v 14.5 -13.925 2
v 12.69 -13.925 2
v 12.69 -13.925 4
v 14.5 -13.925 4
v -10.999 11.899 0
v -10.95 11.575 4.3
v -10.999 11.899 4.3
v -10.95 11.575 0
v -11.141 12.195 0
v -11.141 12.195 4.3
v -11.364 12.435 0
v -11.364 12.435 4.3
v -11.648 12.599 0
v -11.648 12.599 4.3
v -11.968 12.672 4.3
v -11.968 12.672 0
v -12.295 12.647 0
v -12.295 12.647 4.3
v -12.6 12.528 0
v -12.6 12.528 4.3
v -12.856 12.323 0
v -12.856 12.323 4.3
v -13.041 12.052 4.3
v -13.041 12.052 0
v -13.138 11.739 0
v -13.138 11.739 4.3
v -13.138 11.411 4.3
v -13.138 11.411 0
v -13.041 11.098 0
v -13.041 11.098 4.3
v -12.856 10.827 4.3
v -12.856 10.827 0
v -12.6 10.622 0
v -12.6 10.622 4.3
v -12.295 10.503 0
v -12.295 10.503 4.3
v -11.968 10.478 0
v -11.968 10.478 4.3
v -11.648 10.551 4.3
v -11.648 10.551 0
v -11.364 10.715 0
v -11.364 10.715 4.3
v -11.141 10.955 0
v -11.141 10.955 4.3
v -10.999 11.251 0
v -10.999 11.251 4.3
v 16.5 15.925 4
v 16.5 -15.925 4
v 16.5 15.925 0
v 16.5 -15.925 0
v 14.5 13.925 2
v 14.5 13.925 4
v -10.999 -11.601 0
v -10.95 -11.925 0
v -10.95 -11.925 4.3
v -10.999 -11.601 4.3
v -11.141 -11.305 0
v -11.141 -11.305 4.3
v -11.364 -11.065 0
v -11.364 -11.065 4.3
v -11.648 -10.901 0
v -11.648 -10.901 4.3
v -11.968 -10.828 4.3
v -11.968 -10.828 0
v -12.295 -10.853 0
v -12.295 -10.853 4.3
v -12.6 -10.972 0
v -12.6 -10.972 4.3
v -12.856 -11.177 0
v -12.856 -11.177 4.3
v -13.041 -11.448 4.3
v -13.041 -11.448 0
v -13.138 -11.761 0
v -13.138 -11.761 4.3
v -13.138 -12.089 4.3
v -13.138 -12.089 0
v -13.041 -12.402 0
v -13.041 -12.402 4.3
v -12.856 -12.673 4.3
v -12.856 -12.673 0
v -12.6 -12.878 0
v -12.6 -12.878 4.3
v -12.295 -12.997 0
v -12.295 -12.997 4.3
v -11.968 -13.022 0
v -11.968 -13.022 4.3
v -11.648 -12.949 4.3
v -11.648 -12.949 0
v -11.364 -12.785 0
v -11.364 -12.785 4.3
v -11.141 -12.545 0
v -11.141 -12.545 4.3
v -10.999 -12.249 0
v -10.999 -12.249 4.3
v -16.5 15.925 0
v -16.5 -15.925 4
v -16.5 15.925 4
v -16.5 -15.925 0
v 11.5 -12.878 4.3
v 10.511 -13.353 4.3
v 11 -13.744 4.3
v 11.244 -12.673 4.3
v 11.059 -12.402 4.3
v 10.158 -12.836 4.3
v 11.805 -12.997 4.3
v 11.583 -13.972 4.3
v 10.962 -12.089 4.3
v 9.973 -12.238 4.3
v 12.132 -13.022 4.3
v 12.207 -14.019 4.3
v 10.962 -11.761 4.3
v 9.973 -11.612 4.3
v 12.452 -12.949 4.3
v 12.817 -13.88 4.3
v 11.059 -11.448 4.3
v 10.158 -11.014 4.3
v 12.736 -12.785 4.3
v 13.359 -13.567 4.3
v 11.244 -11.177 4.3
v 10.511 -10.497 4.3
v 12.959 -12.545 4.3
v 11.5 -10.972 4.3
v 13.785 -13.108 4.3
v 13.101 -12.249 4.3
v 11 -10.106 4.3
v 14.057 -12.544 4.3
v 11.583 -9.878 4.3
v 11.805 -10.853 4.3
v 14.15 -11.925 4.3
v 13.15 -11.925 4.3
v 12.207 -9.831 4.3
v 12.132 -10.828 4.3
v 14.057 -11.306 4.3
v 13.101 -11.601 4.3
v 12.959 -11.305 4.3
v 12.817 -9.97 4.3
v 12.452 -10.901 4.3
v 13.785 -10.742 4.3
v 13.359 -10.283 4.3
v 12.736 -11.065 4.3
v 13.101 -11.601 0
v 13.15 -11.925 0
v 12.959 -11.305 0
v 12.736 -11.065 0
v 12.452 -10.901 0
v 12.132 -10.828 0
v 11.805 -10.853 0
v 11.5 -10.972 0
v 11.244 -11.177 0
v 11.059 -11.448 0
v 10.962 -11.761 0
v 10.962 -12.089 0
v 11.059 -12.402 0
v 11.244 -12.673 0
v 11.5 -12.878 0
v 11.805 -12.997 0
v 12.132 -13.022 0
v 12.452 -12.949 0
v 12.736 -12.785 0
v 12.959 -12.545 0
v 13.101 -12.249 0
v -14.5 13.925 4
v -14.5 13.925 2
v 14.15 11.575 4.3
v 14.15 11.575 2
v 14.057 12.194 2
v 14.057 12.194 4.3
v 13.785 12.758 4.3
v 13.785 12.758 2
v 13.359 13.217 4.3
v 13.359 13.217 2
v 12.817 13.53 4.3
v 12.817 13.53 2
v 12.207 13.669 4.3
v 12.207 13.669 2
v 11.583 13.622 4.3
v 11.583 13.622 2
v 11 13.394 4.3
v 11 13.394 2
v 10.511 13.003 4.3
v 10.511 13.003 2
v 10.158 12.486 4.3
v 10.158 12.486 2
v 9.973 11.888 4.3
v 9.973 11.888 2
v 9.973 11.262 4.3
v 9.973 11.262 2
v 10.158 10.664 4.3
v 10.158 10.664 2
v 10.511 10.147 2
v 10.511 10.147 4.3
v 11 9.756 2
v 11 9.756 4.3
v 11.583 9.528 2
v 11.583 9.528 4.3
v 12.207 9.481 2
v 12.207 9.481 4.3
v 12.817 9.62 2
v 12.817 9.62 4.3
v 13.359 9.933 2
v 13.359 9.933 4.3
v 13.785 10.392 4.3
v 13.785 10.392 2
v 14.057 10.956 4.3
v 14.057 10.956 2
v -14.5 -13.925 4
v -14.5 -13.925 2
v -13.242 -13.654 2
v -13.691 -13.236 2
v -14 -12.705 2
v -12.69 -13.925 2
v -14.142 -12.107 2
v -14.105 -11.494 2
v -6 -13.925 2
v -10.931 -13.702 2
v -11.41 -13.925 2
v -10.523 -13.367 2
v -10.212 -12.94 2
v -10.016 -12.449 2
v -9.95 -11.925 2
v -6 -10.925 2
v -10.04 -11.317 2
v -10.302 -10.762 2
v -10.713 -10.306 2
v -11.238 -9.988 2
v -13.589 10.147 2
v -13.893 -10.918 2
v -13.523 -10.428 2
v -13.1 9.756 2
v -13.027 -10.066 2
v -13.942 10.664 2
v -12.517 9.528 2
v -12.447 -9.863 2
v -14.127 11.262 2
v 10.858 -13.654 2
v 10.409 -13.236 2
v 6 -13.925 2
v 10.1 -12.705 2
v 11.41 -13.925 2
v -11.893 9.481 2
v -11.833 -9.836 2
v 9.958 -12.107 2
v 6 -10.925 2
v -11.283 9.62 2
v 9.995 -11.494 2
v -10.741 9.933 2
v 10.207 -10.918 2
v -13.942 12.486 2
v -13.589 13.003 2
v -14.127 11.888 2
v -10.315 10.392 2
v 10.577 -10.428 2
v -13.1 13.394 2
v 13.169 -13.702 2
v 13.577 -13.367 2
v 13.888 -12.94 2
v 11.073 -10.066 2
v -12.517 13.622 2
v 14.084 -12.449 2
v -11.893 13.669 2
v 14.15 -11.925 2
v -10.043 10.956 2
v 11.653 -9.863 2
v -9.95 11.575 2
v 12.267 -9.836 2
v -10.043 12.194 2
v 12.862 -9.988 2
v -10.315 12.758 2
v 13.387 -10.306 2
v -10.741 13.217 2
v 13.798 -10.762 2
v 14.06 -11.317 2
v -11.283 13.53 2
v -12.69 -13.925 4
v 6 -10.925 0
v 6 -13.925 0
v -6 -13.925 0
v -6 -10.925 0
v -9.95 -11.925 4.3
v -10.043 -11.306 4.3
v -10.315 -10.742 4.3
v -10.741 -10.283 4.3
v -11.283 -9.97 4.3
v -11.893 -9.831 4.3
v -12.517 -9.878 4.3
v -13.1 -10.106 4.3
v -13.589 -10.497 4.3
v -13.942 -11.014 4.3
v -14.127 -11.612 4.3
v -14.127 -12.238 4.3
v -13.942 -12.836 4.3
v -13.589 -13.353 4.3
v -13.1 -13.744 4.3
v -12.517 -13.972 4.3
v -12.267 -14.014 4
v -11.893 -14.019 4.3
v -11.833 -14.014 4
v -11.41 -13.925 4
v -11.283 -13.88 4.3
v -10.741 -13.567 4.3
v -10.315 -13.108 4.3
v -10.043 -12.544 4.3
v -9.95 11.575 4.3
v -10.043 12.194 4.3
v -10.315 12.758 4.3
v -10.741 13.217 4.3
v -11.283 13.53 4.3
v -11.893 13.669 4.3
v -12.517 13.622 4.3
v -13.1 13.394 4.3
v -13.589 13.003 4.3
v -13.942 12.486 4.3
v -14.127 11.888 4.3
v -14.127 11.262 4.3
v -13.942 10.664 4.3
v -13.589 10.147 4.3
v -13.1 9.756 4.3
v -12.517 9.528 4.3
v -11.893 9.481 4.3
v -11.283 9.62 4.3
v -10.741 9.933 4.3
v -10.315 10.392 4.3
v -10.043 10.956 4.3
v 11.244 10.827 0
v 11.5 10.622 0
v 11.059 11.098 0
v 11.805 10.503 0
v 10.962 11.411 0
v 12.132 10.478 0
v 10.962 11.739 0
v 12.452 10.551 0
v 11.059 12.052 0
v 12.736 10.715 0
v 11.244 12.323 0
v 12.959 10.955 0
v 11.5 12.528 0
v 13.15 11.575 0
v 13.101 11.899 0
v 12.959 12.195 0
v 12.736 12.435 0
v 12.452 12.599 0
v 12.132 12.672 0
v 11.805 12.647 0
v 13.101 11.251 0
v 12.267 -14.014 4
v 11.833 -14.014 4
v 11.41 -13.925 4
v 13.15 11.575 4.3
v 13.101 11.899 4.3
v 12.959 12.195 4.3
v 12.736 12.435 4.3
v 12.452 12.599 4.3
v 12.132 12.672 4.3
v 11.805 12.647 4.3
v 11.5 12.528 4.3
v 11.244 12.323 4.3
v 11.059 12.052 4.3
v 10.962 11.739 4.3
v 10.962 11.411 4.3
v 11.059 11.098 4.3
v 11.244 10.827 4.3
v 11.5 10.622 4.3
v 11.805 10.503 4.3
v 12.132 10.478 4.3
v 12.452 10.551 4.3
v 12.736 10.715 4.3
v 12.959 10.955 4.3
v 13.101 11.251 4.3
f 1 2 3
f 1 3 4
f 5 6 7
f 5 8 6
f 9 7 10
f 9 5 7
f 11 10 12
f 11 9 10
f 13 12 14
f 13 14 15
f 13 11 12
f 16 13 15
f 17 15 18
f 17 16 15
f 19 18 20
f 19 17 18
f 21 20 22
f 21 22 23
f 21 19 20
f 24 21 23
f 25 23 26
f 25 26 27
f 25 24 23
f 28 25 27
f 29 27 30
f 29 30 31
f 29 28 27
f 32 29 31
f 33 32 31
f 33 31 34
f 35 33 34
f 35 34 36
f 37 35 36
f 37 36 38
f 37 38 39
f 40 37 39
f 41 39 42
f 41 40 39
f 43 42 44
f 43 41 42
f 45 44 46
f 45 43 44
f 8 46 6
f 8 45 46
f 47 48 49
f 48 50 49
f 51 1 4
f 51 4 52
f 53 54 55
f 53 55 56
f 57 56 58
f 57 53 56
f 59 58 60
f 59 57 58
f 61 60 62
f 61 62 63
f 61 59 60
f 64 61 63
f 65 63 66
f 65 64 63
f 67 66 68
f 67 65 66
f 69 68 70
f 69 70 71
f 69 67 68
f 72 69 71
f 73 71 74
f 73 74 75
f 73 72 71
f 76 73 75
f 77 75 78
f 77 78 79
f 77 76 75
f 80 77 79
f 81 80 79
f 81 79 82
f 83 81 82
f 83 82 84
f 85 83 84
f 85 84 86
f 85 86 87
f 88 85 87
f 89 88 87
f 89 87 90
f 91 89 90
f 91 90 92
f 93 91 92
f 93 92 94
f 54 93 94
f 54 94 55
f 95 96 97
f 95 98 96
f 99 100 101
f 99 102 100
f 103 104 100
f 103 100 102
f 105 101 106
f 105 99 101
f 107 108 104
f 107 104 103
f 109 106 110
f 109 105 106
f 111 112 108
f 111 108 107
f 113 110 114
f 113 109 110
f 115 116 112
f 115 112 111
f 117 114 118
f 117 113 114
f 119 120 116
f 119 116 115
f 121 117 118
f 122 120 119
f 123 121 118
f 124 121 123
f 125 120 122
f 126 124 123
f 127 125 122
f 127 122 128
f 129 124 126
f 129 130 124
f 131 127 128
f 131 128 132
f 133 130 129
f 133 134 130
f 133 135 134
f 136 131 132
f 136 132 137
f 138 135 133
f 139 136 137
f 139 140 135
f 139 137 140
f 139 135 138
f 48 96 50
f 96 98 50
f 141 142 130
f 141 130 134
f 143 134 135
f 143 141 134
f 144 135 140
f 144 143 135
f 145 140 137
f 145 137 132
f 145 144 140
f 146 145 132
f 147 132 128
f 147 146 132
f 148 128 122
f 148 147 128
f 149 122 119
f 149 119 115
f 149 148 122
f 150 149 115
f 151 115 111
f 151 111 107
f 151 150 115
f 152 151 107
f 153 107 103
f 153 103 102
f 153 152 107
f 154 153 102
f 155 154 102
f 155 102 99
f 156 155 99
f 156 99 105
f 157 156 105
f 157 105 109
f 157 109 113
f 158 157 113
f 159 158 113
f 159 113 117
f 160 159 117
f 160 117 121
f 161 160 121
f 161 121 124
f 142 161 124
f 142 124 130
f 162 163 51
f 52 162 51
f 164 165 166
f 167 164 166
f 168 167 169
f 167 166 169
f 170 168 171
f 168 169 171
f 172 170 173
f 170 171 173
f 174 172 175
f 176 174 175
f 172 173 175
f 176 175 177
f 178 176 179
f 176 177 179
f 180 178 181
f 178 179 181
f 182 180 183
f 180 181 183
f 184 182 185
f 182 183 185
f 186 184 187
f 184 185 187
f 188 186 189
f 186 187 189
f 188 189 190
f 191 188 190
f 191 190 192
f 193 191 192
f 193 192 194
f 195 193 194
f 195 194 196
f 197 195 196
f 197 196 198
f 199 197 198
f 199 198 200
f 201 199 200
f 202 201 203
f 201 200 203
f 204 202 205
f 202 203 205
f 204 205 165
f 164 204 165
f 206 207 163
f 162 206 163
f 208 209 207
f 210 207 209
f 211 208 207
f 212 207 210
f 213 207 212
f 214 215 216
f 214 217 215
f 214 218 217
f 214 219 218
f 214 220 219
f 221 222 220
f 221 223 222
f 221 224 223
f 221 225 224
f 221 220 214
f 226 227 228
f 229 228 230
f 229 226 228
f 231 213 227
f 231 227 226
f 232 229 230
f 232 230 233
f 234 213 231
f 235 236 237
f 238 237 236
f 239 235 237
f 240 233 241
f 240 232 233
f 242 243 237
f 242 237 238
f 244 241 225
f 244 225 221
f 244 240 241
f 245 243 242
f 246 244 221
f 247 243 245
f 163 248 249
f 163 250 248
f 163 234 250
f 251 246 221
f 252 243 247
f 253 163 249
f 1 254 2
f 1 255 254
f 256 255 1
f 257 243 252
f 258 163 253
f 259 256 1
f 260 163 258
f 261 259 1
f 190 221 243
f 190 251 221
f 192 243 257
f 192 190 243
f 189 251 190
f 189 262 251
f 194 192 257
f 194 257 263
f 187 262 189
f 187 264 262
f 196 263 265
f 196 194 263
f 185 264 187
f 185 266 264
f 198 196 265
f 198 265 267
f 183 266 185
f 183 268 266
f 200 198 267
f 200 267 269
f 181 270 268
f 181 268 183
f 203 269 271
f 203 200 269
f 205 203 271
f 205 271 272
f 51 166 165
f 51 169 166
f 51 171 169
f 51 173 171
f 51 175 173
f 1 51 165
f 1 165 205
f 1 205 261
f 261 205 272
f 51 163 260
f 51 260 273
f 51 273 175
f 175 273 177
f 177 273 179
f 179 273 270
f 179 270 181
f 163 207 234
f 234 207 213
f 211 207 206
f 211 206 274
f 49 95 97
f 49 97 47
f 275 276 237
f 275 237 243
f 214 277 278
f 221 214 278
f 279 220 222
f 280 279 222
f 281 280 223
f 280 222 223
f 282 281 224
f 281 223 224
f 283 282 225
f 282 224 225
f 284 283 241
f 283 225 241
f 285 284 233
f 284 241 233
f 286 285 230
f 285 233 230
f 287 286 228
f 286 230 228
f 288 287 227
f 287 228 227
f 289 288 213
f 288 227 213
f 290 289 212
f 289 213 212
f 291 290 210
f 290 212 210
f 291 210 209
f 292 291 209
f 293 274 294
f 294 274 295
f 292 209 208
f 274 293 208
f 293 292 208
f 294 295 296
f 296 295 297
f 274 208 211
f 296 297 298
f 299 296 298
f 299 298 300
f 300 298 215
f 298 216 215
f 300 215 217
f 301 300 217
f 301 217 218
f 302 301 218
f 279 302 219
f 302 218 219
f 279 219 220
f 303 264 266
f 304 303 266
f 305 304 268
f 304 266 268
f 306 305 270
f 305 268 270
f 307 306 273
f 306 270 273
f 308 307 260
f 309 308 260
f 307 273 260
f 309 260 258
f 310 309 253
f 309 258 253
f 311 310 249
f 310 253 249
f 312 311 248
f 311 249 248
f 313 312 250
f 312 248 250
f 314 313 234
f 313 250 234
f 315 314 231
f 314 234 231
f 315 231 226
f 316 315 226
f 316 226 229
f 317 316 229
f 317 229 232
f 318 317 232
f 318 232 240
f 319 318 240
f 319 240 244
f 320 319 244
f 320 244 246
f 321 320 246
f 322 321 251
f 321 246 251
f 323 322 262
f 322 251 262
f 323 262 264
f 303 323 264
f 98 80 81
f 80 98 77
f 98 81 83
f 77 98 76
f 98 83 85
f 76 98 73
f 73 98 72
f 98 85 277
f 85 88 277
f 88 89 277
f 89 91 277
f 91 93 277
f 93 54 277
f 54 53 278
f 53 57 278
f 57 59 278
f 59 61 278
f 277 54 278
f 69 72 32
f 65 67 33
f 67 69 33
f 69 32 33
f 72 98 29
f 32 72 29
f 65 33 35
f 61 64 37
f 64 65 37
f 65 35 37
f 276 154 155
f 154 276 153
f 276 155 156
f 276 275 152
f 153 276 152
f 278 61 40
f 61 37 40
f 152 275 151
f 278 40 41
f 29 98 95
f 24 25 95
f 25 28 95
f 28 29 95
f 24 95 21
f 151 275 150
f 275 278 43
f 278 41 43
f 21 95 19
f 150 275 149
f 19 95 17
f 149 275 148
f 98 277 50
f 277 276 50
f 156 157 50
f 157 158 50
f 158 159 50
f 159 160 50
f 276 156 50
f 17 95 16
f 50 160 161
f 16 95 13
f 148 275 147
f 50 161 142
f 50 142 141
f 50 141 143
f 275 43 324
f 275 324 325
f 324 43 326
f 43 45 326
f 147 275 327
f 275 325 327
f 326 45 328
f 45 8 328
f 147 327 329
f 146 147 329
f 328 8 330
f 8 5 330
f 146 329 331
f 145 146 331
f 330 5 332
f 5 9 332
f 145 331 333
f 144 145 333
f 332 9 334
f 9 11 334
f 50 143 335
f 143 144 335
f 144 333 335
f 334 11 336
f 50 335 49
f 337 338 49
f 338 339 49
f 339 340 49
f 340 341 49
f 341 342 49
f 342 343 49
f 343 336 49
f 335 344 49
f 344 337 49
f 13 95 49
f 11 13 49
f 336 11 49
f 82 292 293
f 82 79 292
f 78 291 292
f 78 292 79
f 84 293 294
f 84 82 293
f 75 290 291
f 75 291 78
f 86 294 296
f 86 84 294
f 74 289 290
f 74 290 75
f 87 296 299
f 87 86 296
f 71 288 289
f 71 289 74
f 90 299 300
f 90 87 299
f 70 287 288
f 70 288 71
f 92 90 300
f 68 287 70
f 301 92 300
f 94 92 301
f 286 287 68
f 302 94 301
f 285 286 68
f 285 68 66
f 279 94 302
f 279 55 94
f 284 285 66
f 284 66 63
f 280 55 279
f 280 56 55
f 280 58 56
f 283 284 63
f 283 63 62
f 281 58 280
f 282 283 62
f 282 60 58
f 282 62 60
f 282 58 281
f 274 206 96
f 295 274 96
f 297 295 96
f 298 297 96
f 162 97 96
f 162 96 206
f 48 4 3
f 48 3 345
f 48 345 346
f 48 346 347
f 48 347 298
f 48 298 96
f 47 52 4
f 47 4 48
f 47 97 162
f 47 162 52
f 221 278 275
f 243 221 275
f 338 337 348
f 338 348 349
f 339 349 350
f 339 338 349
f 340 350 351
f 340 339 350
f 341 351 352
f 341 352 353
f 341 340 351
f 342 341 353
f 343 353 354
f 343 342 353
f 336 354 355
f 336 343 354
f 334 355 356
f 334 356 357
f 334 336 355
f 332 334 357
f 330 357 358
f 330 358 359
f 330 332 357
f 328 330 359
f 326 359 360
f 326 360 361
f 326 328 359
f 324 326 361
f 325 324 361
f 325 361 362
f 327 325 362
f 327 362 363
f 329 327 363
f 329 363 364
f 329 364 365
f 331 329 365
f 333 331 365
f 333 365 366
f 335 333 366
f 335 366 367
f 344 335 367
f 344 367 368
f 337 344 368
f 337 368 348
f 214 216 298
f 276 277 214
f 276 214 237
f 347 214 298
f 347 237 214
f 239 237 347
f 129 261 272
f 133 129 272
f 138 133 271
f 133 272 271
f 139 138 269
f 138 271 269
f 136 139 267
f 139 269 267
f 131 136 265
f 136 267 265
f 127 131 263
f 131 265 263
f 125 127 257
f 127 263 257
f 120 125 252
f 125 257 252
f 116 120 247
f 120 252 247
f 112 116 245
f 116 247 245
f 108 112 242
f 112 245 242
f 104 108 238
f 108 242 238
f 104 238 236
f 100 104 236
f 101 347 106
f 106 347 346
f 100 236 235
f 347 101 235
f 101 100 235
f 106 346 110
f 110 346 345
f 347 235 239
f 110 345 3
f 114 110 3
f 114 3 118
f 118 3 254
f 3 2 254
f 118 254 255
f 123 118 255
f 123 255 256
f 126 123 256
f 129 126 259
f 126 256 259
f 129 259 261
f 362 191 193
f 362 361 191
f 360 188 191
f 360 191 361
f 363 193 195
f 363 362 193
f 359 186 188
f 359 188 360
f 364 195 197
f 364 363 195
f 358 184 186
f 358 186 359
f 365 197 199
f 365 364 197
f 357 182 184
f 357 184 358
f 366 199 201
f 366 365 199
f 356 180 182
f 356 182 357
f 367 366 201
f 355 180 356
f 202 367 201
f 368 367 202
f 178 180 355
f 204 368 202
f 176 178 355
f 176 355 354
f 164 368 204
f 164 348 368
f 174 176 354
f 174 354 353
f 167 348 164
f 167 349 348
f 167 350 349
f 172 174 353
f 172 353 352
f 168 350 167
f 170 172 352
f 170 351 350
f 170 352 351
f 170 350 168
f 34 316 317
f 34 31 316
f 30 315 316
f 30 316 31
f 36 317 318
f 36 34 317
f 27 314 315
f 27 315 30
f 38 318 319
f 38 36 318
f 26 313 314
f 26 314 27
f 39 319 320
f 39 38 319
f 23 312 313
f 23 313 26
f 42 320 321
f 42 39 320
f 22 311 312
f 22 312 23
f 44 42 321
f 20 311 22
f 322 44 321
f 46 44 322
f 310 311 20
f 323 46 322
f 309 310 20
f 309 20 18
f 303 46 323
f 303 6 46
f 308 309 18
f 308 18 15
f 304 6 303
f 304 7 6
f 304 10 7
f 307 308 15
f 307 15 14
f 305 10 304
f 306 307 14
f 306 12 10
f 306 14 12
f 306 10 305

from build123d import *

# Parameters (mm, degrees)
SKETCH1_W           = 33
SKETCH1_H           = 31.85
SKETCH1_R           = 1.1
SKETCH1_W_2         = 12
SKETCH1_H_2         = 3
BOSS_EXTRUDE1_DEPTH = 2
SKETCH2_R           = 2.1
SKETCH2_R_2         = 1.1
BOSS_EXTRUDE2_DEPTH = 2.3
SKETCH3_W           = 33
SKETCH3_H           = 31.85
SKETCH3_W_2         = 29
SKETCH3_H_2         = 27.85
BOSS_EXTRUDE3_DEPTH = 2


with BuildPart() as part:
    # Sketch1 → Boss-Extrude1 (new body)
    with BuildSketch(Plane.XY):
        Rectangle(SKETCH1_W, SKETCH1_H)
        with Locations((-12.05, 11.575)):
            Circle(SKETCH1_R, mode=Mode.SUBTRACT)
        with Locations((12.05, 11.575)):
            Circle(SKETCH1_R, mode=Mode.SUBTRACT)
        with Locations((-12.05, -11.925)):
            Circle(SKETCH1_R, mode=Mode.SUBTRACT)
        with Locations((12.05, -11.925)):
            Circle(SKETCH1_R, mode=Mode.SUBTRACT)
        with Locations((0, -12.425)):
            Rectangle(SKETCH1_W_2, SKETCH1_H_2, mode=Mode.SUBTRACT)
    extrude(amount=BOSS_EXTRUDE1_DEPTH)

    # Sketch2 → Boss-Extrude2 (add)
    # profile 1 of 4: a face of its own
    with BuildSketch(Plane.XY.offset(2)):
        with Locations((-12.05, 11.575)):
            Circle(SKETCH2_R)
        with Locations((-12.05, 11.575)):
            Circle(SKETCH2_R_2, mode=Mode.SUBTRACT)
    # profile 2 of 4: a face of its own
    with BuildSketch(Plane.XY.offset(2)):
        with Locations((-12.05, -11.925)):
            Circle(SKETCH2_R)
        with Locations((-12.05, -11.925)):
            Circle(SKETCH2_R_2, mode=Mode.SUBTRACT)
    # profile 3 of 4: a face of its own
    with BuildSketch(Plane.XY.offset(2)):
        with Locations((12.05, -11.925)):
            Circle(SKETCH2_R)
        with Locations((12.05, -11.925)):
            Circle(SKETCH2_R_2, mode=Mode.SUBTRACT)
    # profile 4 of 4: a face of its own
    with BuildSketch(Plane.XY.offset(2)):
        with Locations((12.05, 11.575)):
            Circle(SKETCH2_R)
        with Locations((12.05, 11.575)):
            Circle(SKETCH2_R_2, mode=Mode.SUBTRACT)
    extrude(amount=BOSS_EXTRUDE2_DEPTH)

    # Sketch3 → Boss-Extrude3 (add)
    with BuildSketch(Plane.XY.offset(2)):
        Rectangle(SKETCH3_W, SKETCH3_H)
        Rectangle(SKETCH3_W_2, SKETCH3_H_2, mode=Mode.SUBTRACT)
    extrude(amount=BOSS_EXTRUDE3_DEPTH)


solid = part.part
